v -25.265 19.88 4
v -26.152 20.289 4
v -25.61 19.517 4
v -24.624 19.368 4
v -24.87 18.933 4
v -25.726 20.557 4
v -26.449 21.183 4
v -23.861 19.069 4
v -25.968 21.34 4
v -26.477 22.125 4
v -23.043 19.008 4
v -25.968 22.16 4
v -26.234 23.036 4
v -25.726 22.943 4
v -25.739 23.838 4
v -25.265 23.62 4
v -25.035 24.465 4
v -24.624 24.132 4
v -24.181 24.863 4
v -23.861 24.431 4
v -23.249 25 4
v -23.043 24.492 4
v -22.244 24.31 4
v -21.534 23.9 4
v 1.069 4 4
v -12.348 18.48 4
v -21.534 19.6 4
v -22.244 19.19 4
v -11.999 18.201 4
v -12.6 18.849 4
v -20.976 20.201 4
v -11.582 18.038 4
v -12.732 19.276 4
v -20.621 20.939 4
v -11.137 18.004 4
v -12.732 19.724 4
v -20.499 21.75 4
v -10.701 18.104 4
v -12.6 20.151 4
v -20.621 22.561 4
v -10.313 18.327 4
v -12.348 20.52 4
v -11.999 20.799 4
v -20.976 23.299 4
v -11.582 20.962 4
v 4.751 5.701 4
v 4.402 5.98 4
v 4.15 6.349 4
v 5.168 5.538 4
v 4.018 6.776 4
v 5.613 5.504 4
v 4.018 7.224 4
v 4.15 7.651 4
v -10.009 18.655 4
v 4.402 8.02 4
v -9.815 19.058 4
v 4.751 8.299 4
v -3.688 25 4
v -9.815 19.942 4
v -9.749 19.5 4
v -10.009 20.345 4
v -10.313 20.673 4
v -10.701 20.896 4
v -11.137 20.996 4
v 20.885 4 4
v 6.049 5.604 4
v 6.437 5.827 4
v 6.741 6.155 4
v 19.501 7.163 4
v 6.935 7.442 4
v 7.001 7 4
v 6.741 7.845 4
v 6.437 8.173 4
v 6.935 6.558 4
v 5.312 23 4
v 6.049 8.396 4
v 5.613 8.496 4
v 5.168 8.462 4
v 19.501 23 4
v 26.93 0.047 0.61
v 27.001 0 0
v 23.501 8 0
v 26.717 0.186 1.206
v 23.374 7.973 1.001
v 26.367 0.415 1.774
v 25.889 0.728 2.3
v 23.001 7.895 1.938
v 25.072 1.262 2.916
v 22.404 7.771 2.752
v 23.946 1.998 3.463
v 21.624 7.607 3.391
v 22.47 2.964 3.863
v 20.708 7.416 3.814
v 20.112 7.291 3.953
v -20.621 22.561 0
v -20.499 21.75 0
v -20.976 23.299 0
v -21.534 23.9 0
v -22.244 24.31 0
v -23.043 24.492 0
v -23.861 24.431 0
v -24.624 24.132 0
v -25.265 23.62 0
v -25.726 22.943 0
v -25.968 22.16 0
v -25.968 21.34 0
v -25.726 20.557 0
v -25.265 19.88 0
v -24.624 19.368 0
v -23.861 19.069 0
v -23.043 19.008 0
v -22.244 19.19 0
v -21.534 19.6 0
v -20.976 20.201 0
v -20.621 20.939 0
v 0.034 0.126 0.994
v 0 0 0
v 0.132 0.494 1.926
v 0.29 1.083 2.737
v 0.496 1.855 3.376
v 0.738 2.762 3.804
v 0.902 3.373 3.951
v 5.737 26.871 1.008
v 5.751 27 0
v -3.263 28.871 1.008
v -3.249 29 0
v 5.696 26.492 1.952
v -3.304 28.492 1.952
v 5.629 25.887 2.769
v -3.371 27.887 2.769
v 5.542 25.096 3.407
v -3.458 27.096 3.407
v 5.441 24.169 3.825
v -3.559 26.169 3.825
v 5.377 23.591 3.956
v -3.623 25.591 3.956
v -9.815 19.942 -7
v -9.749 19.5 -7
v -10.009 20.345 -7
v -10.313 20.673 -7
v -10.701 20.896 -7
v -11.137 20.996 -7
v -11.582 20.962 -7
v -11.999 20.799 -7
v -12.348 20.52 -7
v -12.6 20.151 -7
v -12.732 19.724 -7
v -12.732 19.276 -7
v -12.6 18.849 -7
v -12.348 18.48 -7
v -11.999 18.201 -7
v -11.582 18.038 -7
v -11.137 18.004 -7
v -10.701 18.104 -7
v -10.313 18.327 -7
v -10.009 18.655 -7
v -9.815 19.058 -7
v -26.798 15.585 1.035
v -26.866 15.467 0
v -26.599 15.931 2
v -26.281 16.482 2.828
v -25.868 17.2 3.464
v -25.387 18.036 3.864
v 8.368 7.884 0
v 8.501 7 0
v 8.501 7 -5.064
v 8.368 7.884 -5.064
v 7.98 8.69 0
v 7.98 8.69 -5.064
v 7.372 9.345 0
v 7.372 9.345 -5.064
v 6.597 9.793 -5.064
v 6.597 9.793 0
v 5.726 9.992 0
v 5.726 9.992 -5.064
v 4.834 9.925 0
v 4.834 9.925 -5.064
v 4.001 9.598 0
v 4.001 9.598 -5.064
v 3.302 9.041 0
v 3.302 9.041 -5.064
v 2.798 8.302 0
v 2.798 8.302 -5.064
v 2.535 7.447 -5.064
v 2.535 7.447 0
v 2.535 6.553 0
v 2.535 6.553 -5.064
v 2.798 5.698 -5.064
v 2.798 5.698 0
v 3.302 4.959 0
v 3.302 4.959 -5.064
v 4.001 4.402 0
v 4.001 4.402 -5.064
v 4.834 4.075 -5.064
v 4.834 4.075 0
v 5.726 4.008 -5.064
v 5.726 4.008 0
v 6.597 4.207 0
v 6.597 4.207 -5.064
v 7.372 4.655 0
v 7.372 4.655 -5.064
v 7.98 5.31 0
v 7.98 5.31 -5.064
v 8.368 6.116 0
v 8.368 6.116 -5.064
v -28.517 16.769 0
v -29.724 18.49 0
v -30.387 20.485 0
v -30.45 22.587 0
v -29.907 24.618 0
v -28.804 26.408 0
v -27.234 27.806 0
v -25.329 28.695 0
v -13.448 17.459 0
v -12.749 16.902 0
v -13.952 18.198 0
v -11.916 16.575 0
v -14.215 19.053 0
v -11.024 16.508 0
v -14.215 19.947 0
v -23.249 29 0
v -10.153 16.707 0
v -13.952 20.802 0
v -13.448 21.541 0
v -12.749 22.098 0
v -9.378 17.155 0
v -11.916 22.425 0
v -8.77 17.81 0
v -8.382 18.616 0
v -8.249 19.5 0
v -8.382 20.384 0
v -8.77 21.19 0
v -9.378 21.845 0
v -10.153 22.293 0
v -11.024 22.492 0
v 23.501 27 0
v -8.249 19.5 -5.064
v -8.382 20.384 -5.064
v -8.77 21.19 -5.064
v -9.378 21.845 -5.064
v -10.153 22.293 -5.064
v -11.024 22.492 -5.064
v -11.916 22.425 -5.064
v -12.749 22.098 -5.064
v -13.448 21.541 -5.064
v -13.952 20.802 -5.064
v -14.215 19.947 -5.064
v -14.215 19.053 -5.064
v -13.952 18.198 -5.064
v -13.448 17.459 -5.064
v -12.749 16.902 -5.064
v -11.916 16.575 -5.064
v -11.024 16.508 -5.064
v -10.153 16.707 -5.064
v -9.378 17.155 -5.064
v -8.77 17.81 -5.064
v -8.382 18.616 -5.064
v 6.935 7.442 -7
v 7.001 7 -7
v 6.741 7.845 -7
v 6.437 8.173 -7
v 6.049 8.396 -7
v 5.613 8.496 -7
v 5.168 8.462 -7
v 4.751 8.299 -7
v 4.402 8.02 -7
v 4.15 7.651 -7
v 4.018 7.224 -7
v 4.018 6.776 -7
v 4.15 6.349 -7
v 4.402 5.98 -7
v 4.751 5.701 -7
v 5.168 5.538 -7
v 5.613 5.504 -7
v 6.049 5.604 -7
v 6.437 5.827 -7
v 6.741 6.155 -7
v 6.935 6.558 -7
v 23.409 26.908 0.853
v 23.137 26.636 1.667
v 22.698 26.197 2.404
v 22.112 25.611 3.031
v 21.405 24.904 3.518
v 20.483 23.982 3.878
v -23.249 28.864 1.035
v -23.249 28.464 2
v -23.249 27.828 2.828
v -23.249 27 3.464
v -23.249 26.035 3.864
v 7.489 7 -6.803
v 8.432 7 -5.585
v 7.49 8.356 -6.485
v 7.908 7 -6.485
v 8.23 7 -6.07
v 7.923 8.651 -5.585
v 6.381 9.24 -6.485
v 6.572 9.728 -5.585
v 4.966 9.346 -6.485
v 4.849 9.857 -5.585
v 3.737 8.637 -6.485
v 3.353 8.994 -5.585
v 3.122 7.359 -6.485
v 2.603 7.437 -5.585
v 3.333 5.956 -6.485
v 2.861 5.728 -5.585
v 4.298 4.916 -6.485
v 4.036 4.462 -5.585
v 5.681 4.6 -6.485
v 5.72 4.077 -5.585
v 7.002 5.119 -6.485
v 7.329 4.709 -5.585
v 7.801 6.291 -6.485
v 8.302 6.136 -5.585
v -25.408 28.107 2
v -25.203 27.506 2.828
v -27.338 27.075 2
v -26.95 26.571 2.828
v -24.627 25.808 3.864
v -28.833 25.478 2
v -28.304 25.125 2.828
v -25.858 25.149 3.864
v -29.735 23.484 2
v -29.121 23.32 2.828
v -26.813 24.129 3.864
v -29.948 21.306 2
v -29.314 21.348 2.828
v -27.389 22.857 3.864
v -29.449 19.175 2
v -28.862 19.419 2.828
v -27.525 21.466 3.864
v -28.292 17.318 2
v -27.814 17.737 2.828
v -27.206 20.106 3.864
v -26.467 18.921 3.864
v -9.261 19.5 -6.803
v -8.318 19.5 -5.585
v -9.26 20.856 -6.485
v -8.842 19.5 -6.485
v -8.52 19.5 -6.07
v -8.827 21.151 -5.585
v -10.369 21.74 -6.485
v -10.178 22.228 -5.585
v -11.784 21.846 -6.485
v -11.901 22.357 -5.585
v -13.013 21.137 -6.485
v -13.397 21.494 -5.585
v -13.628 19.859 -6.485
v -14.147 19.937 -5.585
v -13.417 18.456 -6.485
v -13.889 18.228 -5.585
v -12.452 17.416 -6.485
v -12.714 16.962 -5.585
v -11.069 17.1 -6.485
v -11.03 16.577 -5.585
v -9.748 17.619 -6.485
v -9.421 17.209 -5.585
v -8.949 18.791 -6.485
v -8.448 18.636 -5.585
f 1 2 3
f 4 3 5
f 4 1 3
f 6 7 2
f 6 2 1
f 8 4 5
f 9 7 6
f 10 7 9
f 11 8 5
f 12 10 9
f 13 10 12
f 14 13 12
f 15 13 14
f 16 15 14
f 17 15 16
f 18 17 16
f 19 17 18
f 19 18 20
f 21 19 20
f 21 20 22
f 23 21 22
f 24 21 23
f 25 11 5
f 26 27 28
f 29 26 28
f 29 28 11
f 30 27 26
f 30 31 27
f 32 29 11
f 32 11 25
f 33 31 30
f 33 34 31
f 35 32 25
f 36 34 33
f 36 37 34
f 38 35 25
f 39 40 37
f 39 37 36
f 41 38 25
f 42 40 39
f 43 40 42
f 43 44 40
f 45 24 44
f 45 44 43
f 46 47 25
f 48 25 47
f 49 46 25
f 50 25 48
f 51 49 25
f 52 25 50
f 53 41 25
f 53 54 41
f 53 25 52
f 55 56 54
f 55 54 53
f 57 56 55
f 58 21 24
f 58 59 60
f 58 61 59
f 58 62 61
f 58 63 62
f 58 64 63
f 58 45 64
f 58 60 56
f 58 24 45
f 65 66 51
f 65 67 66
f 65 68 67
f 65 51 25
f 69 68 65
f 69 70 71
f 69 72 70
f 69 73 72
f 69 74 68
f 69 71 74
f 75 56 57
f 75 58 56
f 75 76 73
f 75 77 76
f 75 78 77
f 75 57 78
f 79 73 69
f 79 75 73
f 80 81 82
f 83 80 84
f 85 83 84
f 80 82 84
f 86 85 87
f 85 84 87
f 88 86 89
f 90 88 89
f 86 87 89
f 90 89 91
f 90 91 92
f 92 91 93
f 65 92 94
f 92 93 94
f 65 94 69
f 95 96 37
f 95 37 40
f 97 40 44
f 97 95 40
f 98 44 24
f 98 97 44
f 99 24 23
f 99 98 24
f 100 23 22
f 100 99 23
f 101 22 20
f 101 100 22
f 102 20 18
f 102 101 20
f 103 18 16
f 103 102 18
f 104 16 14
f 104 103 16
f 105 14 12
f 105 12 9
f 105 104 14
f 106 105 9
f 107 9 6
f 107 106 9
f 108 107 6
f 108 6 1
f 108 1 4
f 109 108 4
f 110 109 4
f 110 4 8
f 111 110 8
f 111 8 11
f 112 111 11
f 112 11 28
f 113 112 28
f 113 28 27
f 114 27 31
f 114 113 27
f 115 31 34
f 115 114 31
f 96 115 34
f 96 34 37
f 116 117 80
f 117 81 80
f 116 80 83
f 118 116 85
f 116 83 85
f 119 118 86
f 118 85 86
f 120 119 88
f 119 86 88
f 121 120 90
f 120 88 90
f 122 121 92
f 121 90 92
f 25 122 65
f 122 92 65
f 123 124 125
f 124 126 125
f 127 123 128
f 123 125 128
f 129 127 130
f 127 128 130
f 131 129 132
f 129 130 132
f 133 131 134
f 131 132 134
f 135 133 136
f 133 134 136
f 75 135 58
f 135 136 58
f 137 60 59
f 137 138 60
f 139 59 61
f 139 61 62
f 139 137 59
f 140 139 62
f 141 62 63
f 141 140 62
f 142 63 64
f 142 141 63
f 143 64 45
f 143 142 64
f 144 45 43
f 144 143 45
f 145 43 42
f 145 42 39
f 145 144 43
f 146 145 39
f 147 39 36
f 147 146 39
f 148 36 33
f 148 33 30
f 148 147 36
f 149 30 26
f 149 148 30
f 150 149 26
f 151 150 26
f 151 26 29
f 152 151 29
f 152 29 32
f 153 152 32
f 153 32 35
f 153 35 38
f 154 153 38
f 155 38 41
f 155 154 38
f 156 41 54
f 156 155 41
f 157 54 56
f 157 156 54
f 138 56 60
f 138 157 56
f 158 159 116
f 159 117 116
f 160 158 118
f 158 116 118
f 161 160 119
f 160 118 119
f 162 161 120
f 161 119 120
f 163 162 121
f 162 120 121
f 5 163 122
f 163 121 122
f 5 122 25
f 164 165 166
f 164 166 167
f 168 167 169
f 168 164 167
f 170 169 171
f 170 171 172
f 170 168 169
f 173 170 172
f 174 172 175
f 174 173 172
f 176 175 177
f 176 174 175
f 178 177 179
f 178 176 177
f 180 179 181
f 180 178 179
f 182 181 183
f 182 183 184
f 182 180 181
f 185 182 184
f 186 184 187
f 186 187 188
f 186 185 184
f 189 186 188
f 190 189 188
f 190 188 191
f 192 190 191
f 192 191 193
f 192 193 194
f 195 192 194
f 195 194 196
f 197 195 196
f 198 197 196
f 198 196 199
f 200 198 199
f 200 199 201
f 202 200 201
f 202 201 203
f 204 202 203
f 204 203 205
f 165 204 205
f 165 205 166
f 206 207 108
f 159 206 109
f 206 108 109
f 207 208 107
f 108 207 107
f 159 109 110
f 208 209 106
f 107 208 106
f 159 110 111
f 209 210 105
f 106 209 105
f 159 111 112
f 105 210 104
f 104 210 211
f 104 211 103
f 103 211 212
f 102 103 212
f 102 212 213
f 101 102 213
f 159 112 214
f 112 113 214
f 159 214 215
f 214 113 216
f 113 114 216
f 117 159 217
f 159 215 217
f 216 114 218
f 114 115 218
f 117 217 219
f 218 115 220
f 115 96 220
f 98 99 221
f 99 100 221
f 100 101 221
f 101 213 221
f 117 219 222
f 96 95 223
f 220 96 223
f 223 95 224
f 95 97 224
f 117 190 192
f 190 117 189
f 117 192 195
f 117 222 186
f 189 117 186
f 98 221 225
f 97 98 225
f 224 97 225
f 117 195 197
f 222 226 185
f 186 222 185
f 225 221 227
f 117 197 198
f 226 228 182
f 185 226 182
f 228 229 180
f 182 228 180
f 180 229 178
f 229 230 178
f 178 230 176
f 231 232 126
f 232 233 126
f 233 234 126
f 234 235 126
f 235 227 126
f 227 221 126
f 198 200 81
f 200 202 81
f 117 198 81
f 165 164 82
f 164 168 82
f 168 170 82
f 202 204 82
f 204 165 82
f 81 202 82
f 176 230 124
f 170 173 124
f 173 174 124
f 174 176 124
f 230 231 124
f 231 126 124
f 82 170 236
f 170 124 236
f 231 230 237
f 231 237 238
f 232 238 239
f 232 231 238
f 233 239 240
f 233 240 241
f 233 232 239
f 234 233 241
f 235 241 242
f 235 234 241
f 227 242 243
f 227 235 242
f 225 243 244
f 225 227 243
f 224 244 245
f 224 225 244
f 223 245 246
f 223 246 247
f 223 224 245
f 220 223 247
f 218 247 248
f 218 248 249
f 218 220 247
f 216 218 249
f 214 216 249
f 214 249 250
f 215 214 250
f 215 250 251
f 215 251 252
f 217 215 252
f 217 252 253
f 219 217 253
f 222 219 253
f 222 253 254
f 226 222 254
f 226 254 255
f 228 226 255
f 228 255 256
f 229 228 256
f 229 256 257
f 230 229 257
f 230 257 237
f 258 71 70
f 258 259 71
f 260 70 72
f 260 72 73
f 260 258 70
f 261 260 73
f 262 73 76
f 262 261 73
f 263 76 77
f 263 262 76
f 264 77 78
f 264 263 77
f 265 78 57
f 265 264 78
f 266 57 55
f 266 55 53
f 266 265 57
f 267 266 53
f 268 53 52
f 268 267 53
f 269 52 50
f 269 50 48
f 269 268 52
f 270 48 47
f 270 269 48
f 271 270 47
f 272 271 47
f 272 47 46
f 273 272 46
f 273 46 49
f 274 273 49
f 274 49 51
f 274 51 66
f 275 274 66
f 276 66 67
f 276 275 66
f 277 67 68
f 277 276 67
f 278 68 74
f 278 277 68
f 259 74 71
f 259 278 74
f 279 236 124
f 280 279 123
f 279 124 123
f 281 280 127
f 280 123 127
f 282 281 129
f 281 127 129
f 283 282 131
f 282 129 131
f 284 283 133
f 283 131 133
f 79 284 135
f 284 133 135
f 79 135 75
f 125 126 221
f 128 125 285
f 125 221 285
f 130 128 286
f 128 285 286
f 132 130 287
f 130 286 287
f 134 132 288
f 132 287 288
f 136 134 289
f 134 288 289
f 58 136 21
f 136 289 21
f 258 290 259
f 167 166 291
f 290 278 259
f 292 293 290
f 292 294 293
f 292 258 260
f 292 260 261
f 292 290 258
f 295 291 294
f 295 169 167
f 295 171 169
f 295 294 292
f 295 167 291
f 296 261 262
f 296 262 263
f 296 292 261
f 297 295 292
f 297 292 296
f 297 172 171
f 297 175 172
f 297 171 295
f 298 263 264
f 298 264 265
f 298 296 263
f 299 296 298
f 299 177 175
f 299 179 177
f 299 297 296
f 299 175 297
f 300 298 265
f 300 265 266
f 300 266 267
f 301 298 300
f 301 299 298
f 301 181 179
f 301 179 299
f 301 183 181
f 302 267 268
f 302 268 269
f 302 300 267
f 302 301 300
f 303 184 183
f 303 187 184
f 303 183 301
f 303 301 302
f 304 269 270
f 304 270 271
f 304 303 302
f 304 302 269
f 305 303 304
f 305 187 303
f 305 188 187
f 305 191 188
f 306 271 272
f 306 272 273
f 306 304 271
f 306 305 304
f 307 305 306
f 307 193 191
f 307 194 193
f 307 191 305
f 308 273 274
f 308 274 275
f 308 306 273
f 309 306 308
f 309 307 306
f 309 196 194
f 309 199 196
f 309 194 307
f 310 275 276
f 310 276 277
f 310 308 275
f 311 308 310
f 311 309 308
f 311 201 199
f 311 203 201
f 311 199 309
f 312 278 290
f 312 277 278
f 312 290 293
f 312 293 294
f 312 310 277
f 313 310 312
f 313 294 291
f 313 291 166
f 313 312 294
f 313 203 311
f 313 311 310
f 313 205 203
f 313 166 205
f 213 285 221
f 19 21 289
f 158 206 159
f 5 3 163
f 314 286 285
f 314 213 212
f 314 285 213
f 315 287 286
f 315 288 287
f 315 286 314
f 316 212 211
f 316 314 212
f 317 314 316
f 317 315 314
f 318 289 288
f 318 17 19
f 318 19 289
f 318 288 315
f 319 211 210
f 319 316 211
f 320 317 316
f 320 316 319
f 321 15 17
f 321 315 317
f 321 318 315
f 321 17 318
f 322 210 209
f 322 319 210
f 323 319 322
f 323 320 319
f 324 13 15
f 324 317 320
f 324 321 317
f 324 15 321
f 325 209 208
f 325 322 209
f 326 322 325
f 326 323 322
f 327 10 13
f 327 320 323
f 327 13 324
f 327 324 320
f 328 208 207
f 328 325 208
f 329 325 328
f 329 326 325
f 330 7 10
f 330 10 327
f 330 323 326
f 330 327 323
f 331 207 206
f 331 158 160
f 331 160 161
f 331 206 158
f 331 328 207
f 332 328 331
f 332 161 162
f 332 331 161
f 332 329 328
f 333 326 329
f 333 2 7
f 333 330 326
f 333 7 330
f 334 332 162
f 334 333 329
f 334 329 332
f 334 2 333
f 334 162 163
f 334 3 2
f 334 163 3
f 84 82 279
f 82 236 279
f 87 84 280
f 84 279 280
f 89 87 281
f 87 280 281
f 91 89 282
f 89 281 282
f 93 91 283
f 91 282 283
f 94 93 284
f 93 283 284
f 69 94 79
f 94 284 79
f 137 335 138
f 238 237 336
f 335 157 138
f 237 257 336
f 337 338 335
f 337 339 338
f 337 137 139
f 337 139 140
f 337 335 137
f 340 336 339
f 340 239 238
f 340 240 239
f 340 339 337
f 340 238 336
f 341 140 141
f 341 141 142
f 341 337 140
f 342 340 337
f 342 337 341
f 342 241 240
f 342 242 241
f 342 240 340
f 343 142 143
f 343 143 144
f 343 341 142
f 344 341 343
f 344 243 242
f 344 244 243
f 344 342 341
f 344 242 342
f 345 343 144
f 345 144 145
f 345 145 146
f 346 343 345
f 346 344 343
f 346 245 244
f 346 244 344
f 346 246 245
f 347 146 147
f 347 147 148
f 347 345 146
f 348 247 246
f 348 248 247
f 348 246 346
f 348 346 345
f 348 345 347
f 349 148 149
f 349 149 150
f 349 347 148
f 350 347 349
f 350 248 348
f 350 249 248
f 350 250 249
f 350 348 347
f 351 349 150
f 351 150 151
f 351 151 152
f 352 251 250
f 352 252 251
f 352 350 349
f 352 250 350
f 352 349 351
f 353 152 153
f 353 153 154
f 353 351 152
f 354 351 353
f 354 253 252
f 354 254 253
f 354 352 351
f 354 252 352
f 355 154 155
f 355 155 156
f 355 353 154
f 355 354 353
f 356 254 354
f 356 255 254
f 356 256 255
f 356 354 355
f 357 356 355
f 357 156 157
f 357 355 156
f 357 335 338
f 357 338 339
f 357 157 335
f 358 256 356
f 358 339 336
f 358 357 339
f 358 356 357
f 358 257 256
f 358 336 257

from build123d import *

# Parameters (mm, degrees)
F0_R     = 3
F0_R_2   = 2.75
F0_R_3   = 1.5
F1_DEPTH = 4
F2_DEPTH = 7
F4_R     = 3.99999


# Not quite as in the source:
# - a fillet or chamfer that OpenCascade refuses, or shapes differently, is made with other operations: its cross-section is extruded or revolved along the edge and cut away or added
# - a fillet or chamfer is up to 0.001 mm smaller than in the source, because OpenCascade refuses the exact size


with BuildPart() as f1:
    # F0 (on Top) → F1 (new body)
    with BuildSketch(Plane.XY):
        with BuildLine():
            Line((0, 0), (23.5013441249, 0))
            Line((23.5013441249, 0), (23.5013441249, 8))
            Line((23.5013441249, 8), (23.5013441249, 27))
            Line((23.5013441249, 27), (5.7513441249, 27))
            Line((5.7513441249, 27), (-3.2486558751, 29))
            Line((-3.2486558751, 29), (-23.2486558751, 29))
            ThreePointArc((-23.2486558751, 29), (-30.2527750248, 23.6221150973), (-26.8659020001, 15.4668455))
            Line((-26.8659020001, 15.4668455), (0, 0))
        make_face()
        with Locations((5.5013441249, 7)):
            Circle(F0_R, mode=Mode.SUBTRACT)
        with Locations((-23.2486558751, 21.75)):
            Circle(F0_R_2, mode=Mode.SUBTRACT)
        with Locations((-11.2486558751, 19.5)):
            Circle(F0_R, mode=Mode.SUBTRACT)
        Polygon((23.5013441249, 8), (23.5013441249, 0), (27.0013441249, 0), align=None)
        with Locations((-11.2486558751, 19.5)):
            Circle(F0_R)
        with Locations((-11.2486558751, 19.5)):
            Circle(F0_R_3, mode=Mode.SUBTRACT)
        with Locations((5.5013441249, 7)):
            Circle(F0_R)
        with Locations((5.5013441249, 7)):
            Circle(F0_R_3, mode=Mode.SUBTRACT)
    extrude(amount=F1_DEPTH)

    # F0 (on Top) → F2 (join)
    with BuildSketch(Plane.XY):
        with Locations((-11.2486558751, 19.5)):
            Circle(F0_R)
        with Locations((-11.2486558751, 19.5)):
            Circle(F0_R_3, mode=Mode.SUBTRACT)
        with Locations((5.5013441249, 7)):
            Circle(F0_R)
        with Locations((5.5013441249, 7)):
            Circle(F0_R_3, mode=Mode.SUBTRACT)
    extrude(amount=-F2_DEPTH)

    # F3: fillet of radius 2 on 2 edges, made by hand

    # F3_s1 → F3_t2 (revolve, cut)
    with BuildSketch(Plane.XZ.offset(-19.5)):
        with BuildLine():
            ThreePointArc((-9.7486558751, -7), (-8.667517045, -6.2882531983), (-8.2486558751, -5.0635083269))
            Line((-8.2486558751, -5.0635083269), (-8.2486558751, -7))
            Line((-8.2486558751, -7), (-9.7486558751, -7))
        make_face()
    revolve(axis=Axis((-11.2486558751, 19.5, -7), (0, 0, 1)), mode=Mode.SUBTRACT)

    # F3_s3 → F3_t4 (revolve, cut)
    with BuildSketch(Plane.XZ.offset(-7)):
        with BuildLine():
            ThreePointArc((7.0013441249, -7), (8.082482955, -6.2882531983), (8.5013441249, -5.0635083269))
            Line((8.5013441249, -5.0635083269), (8.5013441249, -7))
            Line((8.5013441249, -7), (7.0013441249, -7))
        make_face()
    revolve(axis=Axis((5.5013441249, 7, -7), (0, 0, 1)), mode=Mode.SUBTRACT)

    # F4 (radius 4 in the source; OpenCascade refuses exactly that, so slightly less here)
    f4_edges = [f1.edges().sort_by_distance(p)[0] for p in [
        (-13.248656, 29, 4),
        (13.500672, 0, 4),
        (25.251344, 4, 4),
        (23.501344, 17.5, 4),
        (1.251344, 28, 4),
        (14.626344, 27, 4),
        (-13.432951, 7.733423, 4),
        (-30.252775, 23.622115, 4),
    ]]
    fillet(f4_edges, radius=F4_R)


solid = f1.part
